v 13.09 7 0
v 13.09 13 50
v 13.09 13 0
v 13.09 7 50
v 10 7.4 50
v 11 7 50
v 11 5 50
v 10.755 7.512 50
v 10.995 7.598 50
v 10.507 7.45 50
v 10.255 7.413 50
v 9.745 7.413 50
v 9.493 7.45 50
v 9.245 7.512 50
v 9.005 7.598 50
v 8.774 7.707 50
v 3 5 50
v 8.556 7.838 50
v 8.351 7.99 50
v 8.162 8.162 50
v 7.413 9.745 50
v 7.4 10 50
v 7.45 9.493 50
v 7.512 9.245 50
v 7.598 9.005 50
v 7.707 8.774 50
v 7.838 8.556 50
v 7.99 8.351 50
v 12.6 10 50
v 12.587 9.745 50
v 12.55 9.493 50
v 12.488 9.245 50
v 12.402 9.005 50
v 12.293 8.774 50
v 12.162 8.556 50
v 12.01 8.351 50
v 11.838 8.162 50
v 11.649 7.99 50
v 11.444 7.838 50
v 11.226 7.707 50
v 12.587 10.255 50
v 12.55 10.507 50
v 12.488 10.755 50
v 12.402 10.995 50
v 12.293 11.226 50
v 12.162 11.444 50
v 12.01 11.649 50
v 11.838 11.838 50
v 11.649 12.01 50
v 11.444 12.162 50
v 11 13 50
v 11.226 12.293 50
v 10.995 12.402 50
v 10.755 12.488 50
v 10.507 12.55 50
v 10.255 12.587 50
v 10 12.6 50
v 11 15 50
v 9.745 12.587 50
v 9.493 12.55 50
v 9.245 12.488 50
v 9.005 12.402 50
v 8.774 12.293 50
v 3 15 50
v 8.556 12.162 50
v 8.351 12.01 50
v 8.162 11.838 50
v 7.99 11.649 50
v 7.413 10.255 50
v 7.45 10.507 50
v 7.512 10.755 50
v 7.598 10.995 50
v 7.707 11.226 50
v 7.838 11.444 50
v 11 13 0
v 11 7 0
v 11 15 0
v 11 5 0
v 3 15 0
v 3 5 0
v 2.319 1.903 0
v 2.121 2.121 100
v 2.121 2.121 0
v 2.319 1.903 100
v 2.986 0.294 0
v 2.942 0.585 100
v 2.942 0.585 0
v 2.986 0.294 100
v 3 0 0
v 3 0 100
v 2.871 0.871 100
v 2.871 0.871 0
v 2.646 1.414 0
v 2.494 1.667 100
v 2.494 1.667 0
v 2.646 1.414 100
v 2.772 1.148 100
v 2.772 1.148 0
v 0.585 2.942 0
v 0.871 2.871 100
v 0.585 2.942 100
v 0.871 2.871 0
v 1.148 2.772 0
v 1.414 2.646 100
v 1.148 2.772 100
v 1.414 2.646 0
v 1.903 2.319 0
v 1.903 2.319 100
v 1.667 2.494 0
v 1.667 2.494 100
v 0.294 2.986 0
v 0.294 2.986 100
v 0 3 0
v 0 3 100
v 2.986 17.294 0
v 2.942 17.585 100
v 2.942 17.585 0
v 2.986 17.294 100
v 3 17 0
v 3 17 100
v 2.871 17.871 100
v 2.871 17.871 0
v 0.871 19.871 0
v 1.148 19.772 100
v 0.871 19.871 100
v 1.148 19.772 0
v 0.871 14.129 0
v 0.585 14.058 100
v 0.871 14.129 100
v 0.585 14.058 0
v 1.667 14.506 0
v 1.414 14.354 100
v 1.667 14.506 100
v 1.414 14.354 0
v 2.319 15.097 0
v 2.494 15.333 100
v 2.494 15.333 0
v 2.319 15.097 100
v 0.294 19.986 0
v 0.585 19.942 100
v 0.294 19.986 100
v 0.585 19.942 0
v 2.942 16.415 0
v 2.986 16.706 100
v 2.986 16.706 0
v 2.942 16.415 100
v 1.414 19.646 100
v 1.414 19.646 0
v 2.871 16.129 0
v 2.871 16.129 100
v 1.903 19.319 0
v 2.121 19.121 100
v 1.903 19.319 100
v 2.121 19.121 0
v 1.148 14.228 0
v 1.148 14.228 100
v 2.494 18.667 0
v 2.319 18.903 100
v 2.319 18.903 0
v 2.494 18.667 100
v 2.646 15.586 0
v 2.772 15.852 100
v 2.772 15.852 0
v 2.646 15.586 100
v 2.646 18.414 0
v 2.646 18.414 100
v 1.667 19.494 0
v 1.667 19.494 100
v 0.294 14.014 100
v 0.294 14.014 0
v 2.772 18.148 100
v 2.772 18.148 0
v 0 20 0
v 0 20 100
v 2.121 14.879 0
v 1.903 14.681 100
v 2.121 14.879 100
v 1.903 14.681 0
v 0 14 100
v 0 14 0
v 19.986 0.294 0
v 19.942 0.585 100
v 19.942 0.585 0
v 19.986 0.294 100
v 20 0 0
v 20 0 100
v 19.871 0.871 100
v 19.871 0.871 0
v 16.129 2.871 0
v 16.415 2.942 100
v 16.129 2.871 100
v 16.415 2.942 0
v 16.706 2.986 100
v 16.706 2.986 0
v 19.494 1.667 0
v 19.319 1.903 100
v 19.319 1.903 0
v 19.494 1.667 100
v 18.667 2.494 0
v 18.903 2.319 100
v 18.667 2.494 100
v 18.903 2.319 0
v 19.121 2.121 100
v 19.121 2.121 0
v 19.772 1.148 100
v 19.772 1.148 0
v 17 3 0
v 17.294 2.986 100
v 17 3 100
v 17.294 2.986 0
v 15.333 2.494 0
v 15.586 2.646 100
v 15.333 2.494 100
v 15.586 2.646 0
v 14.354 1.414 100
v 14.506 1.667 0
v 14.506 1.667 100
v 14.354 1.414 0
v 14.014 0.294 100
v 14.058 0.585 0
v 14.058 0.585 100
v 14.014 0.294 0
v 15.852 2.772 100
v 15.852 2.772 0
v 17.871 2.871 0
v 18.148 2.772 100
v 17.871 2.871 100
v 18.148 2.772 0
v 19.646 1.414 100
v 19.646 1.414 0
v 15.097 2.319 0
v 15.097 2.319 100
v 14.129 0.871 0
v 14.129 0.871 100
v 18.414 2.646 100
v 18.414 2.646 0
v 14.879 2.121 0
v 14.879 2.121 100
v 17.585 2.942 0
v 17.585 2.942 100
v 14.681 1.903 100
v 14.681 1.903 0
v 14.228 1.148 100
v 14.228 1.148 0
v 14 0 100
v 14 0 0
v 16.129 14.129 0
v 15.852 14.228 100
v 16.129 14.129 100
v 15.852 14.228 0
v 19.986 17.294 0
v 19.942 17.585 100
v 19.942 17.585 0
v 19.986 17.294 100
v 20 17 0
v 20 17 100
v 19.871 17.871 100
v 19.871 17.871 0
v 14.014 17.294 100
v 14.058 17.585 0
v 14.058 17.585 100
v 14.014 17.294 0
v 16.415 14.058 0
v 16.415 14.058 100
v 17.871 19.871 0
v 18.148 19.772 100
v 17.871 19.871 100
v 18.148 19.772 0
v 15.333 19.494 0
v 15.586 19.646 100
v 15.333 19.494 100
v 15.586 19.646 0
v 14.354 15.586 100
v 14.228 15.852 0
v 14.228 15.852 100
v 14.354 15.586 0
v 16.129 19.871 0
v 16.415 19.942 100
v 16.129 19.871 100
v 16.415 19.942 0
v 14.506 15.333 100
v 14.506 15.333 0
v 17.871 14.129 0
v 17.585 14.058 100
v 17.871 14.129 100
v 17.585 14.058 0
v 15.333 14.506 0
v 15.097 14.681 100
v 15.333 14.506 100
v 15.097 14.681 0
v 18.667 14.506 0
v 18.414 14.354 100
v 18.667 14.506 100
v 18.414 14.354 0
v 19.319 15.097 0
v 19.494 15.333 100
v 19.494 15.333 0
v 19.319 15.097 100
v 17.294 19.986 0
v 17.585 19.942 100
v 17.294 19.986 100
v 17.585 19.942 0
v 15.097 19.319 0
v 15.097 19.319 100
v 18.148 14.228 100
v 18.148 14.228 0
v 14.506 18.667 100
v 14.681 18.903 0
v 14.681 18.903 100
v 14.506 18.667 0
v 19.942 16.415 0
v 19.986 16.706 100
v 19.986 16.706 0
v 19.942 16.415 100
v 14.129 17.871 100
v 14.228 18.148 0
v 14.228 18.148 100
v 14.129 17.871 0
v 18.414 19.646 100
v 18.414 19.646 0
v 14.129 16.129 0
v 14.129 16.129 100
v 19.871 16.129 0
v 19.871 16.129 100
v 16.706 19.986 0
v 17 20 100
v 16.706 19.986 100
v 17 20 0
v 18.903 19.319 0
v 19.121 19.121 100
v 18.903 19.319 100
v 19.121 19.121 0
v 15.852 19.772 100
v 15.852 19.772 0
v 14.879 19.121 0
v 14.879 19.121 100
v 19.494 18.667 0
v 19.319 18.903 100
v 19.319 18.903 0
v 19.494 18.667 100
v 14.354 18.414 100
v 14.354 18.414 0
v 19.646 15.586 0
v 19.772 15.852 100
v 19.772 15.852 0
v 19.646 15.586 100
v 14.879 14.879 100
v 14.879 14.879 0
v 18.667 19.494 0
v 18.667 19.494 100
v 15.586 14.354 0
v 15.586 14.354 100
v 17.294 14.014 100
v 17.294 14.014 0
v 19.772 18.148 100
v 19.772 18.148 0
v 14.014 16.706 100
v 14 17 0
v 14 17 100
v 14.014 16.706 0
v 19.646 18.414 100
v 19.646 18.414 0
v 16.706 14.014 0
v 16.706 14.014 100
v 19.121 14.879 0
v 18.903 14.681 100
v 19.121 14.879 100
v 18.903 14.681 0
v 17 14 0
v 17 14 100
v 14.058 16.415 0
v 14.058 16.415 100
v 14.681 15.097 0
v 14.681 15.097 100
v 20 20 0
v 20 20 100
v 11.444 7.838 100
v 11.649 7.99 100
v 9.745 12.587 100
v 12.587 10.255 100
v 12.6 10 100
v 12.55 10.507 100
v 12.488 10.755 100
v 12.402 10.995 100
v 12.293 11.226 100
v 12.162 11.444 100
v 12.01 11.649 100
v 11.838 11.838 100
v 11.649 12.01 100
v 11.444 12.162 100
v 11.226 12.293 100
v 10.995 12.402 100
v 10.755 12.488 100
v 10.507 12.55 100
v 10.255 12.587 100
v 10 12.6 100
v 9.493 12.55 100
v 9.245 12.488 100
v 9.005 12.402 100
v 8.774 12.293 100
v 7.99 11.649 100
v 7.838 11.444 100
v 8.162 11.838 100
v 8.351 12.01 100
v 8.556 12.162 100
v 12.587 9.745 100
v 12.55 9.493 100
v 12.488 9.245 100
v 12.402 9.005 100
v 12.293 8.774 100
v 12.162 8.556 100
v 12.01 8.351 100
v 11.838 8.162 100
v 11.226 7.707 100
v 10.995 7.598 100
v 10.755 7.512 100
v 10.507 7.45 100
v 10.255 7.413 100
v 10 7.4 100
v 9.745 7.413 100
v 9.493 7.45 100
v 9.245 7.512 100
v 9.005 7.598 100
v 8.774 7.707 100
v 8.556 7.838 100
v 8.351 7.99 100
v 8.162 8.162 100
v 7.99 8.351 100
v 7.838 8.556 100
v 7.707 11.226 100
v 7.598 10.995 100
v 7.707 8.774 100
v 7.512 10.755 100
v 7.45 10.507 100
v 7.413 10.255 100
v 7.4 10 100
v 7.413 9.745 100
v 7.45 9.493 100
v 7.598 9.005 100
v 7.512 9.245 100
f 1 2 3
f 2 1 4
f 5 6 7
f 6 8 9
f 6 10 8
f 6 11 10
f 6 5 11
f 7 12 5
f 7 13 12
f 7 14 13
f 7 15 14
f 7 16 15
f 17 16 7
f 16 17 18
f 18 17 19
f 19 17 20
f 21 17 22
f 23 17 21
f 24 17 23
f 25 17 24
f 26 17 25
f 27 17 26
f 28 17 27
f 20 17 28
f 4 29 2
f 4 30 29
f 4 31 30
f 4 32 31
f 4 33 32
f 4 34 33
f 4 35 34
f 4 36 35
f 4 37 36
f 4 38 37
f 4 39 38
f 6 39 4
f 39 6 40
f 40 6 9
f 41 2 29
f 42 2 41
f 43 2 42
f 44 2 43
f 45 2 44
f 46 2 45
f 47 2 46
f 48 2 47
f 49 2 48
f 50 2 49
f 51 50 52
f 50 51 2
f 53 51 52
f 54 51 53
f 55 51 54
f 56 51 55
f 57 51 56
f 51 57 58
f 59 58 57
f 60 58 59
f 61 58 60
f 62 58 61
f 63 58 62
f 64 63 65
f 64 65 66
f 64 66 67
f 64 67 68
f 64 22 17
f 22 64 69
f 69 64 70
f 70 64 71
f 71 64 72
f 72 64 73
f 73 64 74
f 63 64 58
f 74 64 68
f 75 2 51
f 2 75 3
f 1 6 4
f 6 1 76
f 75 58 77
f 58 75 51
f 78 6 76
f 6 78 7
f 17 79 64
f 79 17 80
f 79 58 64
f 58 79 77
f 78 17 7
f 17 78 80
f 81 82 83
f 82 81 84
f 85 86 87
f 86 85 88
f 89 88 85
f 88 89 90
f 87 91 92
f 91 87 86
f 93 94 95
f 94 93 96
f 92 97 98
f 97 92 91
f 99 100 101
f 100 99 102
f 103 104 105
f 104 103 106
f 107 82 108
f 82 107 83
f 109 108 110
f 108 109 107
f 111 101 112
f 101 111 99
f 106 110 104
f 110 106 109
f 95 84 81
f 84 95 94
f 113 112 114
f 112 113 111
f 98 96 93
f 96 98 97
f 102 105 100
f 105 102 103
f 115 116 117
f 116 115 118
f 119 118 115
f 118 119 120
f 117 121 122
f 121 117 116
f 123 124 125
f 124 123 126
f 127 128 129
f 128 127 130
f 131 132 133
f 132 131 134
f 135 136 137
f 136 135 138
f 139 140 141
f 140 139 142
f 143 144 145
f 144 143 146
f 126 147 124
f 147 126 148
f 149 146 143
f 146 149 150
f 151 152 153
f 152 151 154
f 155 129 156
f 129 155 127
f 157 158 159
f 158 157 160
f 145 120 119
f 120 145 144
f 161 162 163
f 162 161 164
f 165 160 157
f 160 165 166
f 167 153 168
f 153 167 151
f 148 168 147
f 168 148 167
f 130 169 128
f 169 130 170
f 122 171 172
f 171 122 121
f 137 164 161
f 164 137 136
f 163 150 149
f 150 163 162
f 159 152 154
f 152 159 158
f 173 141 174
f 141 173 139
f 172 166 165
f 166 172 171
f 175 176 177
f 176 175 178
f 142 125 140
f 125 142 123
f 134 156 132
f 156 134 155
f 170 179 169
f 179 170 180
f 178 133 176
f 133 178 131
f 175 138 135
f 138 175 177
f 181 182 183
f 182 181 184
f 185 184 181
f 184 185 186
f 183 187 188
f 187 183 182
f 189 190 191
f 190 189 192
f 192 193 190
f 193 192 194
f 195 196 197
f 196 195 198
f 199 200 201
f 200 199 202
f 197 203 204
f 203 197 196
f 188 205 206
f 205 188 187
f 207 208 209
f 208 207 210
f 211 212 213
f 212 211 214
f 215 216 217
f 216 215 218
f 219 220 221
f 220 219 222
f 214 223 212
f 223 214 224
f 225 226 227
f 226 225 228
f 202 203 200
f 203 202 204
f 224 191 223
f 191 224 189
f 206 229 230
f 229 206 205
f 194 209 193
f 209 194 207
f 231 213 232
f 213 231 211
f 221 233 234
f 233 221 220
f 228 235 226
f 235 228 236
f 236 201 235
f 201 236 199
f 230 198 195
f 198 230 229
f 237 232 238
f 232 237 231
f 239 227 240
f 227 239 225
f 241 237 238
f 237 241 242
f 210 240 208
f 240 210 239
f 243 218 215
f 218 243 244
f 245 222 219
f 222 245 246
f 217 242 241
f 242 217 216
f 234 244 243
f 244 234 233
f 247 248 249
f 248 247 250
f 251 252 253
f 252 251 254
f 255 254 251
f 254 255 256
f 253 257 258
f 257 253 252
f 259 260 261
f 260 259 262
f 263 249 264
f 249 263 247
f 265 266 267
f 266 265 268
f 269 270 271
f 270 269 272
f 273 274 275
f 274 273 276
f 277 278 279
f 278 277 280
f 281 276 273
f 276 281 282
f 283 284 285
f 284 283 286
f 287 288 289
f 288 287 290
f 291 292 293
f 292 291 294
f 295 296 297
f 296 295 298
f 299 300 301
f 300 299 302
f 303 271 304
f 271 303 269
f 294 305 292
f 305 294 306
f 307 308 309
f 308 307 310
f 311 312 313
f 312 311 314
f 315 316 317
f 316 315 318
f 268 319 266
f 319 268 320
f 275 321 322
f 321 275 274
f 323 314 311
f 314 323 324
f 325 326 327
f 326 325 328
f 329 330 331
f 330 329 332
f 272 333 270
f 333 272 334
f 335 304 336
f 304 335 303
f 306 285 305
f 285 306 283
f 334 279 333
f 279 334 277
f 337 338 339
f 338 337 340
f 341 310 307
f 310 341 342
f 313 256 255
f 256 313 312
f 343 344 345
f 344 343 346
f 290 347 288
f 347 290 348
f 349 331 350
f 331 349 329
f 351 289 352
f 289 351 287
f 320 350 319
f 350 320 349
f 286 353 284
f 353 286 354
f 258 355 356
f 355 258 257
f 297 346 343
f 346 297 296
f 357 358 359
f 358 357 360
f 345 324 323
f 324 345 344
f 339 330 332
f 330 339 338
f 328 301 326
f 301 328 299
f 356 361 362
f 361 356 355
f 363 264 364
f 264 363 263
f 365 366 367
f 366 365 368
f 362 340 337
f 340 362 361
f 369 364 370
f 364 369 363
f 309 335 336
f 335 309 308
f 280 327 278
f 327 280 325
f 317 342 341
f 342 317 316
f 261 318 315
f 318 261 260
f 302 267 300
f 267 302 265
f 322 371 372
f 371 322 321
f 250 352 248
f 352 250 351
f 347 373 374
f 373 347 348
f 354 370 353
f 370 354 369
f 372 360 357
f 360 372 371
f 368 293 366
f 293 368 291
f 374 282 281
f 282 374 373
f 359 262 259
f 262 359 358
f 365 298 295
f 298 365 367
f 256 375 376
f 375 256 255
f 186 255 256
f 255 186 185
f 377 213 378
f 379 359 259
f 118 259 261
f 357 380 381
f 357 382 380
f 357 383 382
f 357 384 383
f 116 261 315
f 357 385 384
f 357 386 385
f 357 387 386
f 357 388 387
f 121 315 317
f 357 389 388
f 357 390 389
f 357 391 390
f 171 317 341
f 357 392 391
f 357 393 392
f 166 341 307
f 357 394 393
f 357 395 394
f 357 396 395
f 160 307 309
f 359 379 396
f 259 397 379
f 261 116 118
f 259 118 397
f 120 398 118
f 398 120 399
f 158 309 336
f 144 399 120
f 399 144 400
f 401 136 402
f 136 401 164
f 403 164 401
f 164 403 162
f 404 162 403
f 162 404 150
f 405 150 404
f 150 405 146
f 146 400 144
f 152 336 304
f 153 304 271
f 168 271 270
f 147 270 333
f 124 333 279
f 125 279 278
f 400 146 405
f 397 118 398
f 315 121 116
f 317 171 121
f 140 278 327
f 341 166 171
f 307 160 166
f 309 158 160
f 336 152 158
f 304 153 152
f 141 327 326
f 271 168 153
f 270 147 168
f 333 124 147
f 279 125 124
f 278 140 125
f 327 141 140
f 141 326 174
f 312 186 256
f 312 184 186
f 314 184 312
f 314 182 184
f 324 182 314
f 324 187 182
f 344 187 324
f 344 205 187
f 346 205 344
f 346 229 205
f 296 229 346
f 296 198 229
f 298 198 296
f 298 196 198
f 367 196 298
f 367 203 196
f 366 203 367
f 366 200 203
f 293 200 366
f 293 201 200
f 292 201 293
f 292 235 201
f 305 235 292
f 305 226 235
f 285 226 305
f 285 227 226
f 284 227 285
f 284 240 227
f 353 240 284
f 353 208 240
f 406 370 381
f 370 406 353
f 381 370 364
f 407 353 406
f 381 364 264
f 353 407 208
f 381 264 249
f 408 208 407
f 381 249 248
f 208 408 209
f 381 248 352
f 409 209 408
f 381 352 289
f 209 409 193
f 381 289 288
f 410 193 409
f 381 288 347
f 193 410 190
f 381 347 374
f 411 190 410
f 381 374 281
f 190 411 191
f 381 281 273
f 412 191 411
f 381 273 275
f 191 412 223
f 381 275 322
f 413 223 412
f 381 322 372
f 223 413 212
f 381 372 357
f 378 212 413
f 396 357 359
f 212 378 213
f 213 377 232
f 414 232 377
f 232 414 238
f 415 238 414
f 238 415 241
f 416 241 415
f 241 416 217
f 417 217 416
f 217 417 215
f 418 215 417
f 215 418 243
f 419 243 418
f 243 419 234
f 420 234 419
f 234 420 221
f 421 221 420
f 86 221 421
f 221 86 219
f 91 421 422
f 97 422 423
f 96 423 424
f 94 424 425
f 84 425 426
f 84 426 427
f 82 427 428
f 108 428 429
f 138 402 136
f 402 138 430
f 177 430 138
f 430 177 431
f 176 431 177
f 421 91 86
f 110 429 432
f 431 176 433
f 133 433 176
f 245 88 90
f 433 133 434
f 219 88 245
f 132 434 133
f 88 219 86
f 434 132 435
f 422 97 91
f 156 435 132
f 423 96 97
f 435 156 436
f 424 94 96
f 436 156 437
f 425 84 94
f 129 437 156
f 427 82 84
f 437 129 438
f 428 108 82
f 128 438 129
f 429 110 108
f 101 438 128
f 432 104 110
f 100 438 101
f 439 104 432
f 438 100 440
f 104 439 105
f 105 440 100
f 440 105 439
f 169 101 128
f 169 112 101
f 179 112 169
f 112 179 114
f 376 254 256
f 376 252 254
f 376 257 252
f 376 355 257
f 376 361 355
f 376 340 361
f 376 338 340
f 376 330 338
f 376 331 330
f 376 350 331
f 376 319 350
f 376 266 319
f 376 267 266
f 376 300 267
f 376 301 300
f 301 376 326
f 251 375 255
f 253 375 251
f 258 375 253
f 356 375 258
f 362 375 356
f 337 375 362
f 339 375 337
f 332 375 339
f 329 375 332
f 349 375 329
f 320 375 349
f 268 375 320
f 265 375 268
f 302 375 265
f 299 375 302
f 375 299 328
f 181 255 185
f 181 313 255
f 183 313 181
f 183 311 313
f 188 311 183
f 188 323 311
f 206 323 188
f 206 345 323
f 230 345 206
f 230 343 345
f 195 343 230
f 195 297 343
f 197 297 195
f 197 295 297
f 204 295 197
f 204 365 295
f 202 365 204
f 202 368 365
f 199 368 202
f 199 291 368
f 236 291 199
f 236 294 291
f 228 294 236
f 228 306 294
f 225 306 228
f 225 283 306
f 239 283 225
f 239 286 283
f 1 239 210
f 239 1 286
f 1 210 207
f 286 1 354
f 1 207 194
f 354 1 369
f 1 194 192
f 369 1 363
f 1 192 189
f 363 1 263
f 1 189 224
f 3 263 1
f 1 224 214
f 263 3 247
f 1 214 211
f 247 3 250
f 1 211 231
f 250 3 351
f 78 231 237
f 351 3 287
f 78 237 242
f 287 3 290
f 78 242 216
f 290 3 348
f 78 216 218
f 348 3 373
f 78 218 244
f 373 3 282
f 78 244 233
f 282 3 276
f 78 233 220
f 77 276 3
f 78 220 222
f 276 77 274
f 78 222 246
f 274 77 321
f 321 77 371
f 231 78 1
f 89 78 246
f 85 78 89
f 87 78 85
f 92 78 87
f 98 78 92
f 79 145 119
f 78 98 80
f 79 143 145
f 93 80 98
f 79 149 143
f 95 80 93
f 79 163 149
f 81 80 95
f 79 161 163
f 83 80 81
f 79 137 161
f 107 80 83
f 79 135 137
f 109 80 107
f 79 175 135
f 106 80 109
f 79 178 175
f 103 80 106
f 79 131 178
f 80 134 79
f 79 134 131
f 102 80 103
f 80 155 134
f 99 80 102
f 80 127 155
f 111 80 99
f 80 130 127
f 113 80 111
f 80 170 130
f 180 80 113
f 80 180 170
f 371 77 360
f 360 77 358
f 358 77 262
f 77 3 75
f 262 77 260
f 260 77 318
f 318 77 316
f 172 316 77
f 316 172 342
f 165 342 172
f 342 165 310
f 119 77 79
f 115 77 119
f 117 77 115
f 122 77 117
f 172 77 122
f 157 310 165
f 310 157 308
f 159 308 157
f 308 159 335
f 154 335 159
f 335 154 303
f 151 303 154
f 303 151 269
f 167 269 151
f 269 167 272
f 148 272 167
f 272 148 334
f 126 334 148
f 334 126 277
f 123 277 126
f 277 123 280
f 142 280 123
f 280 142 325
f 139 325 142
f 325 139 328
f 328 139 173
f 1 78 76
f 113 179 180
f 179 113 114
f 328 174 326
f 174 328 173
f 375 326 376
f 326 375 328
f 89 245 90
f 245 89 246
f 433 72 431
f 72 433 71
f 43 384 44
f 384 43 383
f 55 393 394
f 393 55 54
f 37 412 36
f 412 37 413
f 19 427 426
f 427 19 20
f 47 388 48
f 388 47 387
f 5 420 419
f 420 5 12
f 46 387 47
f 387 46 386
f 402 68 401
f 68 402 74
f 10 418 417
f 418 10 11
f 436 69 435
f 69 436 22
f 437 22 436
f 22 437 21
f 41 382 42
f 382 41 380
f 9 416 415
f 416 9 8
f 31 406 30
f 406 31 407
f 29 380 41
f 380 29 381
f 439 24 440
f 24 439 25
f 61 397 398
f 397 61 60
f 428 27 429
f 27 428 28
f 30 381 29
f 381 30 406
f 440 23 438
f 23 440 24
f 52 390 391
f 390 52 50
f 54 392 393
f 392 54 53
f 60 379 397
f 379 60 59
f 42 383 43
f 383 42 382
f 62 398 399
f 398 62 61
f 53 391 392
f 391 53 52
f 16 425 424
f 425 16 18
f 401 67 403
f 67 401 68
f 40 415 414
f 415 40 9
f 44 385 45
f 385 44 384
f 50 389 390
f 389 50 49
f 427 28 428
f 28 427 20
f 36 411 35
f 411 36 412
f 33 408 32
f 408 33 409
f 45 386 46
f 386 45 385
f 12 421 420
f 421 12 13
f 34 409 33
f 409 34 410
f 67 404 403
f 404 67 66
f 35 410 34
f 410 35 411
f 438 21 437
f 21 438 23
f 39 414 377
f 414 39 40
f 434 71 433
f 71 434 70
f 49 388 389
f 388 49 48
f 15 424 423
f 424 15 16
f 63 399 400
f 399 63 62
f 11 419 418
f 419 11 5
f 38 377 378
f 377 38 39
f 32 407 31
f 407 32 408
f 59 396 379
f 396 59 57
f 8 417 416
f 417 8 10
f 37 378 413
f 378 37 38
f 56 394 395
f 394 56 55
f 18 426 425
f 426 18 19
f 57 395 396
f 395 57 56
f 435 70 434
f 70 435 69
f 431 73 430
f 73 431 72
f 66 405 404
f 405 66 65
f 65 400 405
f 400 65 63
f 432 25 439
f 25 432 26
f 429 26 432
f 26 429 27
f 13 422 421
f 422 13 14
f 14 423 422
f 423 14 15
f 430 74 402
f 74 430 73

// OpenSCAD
$fn = 64;

length = 100;
size = 20;

difference() {
    // Outer body
    cube([size, size, length], center=false);

    // Central bore (typical for 2020-style extrusion)
    translate([size/2, size/2, -0.5])
        cylinder(h=length+1, d=5.2, center=false);

    // Four T-slots (simplified)
    for (rot = [0, 90, 180, 270]) {
        rotate([0, 0, rot]) {
            // Slot opening from the outside
            translate([size/2 - 0.01, size/2, -0.5])
                cube([6.2, 6.0, length+1], center=true);

            // Inner cavity behind the opening
            translate([size/2 - 3.0, size/2, -0.5])
                cube([8.0, 10.0, length+1], center=true);
        }
    }

    // Corner reliefs (simplified)
    for (sx = [0, 1], sy = [0, 1]) {
        translate([sx*size, sy*size, -0.5])
            translate([sx ? -3.0 : 0, sy ? -3.0 : 0, 0])
                cylinder(h=length+1, r=3.0, center=false);
    }
}
